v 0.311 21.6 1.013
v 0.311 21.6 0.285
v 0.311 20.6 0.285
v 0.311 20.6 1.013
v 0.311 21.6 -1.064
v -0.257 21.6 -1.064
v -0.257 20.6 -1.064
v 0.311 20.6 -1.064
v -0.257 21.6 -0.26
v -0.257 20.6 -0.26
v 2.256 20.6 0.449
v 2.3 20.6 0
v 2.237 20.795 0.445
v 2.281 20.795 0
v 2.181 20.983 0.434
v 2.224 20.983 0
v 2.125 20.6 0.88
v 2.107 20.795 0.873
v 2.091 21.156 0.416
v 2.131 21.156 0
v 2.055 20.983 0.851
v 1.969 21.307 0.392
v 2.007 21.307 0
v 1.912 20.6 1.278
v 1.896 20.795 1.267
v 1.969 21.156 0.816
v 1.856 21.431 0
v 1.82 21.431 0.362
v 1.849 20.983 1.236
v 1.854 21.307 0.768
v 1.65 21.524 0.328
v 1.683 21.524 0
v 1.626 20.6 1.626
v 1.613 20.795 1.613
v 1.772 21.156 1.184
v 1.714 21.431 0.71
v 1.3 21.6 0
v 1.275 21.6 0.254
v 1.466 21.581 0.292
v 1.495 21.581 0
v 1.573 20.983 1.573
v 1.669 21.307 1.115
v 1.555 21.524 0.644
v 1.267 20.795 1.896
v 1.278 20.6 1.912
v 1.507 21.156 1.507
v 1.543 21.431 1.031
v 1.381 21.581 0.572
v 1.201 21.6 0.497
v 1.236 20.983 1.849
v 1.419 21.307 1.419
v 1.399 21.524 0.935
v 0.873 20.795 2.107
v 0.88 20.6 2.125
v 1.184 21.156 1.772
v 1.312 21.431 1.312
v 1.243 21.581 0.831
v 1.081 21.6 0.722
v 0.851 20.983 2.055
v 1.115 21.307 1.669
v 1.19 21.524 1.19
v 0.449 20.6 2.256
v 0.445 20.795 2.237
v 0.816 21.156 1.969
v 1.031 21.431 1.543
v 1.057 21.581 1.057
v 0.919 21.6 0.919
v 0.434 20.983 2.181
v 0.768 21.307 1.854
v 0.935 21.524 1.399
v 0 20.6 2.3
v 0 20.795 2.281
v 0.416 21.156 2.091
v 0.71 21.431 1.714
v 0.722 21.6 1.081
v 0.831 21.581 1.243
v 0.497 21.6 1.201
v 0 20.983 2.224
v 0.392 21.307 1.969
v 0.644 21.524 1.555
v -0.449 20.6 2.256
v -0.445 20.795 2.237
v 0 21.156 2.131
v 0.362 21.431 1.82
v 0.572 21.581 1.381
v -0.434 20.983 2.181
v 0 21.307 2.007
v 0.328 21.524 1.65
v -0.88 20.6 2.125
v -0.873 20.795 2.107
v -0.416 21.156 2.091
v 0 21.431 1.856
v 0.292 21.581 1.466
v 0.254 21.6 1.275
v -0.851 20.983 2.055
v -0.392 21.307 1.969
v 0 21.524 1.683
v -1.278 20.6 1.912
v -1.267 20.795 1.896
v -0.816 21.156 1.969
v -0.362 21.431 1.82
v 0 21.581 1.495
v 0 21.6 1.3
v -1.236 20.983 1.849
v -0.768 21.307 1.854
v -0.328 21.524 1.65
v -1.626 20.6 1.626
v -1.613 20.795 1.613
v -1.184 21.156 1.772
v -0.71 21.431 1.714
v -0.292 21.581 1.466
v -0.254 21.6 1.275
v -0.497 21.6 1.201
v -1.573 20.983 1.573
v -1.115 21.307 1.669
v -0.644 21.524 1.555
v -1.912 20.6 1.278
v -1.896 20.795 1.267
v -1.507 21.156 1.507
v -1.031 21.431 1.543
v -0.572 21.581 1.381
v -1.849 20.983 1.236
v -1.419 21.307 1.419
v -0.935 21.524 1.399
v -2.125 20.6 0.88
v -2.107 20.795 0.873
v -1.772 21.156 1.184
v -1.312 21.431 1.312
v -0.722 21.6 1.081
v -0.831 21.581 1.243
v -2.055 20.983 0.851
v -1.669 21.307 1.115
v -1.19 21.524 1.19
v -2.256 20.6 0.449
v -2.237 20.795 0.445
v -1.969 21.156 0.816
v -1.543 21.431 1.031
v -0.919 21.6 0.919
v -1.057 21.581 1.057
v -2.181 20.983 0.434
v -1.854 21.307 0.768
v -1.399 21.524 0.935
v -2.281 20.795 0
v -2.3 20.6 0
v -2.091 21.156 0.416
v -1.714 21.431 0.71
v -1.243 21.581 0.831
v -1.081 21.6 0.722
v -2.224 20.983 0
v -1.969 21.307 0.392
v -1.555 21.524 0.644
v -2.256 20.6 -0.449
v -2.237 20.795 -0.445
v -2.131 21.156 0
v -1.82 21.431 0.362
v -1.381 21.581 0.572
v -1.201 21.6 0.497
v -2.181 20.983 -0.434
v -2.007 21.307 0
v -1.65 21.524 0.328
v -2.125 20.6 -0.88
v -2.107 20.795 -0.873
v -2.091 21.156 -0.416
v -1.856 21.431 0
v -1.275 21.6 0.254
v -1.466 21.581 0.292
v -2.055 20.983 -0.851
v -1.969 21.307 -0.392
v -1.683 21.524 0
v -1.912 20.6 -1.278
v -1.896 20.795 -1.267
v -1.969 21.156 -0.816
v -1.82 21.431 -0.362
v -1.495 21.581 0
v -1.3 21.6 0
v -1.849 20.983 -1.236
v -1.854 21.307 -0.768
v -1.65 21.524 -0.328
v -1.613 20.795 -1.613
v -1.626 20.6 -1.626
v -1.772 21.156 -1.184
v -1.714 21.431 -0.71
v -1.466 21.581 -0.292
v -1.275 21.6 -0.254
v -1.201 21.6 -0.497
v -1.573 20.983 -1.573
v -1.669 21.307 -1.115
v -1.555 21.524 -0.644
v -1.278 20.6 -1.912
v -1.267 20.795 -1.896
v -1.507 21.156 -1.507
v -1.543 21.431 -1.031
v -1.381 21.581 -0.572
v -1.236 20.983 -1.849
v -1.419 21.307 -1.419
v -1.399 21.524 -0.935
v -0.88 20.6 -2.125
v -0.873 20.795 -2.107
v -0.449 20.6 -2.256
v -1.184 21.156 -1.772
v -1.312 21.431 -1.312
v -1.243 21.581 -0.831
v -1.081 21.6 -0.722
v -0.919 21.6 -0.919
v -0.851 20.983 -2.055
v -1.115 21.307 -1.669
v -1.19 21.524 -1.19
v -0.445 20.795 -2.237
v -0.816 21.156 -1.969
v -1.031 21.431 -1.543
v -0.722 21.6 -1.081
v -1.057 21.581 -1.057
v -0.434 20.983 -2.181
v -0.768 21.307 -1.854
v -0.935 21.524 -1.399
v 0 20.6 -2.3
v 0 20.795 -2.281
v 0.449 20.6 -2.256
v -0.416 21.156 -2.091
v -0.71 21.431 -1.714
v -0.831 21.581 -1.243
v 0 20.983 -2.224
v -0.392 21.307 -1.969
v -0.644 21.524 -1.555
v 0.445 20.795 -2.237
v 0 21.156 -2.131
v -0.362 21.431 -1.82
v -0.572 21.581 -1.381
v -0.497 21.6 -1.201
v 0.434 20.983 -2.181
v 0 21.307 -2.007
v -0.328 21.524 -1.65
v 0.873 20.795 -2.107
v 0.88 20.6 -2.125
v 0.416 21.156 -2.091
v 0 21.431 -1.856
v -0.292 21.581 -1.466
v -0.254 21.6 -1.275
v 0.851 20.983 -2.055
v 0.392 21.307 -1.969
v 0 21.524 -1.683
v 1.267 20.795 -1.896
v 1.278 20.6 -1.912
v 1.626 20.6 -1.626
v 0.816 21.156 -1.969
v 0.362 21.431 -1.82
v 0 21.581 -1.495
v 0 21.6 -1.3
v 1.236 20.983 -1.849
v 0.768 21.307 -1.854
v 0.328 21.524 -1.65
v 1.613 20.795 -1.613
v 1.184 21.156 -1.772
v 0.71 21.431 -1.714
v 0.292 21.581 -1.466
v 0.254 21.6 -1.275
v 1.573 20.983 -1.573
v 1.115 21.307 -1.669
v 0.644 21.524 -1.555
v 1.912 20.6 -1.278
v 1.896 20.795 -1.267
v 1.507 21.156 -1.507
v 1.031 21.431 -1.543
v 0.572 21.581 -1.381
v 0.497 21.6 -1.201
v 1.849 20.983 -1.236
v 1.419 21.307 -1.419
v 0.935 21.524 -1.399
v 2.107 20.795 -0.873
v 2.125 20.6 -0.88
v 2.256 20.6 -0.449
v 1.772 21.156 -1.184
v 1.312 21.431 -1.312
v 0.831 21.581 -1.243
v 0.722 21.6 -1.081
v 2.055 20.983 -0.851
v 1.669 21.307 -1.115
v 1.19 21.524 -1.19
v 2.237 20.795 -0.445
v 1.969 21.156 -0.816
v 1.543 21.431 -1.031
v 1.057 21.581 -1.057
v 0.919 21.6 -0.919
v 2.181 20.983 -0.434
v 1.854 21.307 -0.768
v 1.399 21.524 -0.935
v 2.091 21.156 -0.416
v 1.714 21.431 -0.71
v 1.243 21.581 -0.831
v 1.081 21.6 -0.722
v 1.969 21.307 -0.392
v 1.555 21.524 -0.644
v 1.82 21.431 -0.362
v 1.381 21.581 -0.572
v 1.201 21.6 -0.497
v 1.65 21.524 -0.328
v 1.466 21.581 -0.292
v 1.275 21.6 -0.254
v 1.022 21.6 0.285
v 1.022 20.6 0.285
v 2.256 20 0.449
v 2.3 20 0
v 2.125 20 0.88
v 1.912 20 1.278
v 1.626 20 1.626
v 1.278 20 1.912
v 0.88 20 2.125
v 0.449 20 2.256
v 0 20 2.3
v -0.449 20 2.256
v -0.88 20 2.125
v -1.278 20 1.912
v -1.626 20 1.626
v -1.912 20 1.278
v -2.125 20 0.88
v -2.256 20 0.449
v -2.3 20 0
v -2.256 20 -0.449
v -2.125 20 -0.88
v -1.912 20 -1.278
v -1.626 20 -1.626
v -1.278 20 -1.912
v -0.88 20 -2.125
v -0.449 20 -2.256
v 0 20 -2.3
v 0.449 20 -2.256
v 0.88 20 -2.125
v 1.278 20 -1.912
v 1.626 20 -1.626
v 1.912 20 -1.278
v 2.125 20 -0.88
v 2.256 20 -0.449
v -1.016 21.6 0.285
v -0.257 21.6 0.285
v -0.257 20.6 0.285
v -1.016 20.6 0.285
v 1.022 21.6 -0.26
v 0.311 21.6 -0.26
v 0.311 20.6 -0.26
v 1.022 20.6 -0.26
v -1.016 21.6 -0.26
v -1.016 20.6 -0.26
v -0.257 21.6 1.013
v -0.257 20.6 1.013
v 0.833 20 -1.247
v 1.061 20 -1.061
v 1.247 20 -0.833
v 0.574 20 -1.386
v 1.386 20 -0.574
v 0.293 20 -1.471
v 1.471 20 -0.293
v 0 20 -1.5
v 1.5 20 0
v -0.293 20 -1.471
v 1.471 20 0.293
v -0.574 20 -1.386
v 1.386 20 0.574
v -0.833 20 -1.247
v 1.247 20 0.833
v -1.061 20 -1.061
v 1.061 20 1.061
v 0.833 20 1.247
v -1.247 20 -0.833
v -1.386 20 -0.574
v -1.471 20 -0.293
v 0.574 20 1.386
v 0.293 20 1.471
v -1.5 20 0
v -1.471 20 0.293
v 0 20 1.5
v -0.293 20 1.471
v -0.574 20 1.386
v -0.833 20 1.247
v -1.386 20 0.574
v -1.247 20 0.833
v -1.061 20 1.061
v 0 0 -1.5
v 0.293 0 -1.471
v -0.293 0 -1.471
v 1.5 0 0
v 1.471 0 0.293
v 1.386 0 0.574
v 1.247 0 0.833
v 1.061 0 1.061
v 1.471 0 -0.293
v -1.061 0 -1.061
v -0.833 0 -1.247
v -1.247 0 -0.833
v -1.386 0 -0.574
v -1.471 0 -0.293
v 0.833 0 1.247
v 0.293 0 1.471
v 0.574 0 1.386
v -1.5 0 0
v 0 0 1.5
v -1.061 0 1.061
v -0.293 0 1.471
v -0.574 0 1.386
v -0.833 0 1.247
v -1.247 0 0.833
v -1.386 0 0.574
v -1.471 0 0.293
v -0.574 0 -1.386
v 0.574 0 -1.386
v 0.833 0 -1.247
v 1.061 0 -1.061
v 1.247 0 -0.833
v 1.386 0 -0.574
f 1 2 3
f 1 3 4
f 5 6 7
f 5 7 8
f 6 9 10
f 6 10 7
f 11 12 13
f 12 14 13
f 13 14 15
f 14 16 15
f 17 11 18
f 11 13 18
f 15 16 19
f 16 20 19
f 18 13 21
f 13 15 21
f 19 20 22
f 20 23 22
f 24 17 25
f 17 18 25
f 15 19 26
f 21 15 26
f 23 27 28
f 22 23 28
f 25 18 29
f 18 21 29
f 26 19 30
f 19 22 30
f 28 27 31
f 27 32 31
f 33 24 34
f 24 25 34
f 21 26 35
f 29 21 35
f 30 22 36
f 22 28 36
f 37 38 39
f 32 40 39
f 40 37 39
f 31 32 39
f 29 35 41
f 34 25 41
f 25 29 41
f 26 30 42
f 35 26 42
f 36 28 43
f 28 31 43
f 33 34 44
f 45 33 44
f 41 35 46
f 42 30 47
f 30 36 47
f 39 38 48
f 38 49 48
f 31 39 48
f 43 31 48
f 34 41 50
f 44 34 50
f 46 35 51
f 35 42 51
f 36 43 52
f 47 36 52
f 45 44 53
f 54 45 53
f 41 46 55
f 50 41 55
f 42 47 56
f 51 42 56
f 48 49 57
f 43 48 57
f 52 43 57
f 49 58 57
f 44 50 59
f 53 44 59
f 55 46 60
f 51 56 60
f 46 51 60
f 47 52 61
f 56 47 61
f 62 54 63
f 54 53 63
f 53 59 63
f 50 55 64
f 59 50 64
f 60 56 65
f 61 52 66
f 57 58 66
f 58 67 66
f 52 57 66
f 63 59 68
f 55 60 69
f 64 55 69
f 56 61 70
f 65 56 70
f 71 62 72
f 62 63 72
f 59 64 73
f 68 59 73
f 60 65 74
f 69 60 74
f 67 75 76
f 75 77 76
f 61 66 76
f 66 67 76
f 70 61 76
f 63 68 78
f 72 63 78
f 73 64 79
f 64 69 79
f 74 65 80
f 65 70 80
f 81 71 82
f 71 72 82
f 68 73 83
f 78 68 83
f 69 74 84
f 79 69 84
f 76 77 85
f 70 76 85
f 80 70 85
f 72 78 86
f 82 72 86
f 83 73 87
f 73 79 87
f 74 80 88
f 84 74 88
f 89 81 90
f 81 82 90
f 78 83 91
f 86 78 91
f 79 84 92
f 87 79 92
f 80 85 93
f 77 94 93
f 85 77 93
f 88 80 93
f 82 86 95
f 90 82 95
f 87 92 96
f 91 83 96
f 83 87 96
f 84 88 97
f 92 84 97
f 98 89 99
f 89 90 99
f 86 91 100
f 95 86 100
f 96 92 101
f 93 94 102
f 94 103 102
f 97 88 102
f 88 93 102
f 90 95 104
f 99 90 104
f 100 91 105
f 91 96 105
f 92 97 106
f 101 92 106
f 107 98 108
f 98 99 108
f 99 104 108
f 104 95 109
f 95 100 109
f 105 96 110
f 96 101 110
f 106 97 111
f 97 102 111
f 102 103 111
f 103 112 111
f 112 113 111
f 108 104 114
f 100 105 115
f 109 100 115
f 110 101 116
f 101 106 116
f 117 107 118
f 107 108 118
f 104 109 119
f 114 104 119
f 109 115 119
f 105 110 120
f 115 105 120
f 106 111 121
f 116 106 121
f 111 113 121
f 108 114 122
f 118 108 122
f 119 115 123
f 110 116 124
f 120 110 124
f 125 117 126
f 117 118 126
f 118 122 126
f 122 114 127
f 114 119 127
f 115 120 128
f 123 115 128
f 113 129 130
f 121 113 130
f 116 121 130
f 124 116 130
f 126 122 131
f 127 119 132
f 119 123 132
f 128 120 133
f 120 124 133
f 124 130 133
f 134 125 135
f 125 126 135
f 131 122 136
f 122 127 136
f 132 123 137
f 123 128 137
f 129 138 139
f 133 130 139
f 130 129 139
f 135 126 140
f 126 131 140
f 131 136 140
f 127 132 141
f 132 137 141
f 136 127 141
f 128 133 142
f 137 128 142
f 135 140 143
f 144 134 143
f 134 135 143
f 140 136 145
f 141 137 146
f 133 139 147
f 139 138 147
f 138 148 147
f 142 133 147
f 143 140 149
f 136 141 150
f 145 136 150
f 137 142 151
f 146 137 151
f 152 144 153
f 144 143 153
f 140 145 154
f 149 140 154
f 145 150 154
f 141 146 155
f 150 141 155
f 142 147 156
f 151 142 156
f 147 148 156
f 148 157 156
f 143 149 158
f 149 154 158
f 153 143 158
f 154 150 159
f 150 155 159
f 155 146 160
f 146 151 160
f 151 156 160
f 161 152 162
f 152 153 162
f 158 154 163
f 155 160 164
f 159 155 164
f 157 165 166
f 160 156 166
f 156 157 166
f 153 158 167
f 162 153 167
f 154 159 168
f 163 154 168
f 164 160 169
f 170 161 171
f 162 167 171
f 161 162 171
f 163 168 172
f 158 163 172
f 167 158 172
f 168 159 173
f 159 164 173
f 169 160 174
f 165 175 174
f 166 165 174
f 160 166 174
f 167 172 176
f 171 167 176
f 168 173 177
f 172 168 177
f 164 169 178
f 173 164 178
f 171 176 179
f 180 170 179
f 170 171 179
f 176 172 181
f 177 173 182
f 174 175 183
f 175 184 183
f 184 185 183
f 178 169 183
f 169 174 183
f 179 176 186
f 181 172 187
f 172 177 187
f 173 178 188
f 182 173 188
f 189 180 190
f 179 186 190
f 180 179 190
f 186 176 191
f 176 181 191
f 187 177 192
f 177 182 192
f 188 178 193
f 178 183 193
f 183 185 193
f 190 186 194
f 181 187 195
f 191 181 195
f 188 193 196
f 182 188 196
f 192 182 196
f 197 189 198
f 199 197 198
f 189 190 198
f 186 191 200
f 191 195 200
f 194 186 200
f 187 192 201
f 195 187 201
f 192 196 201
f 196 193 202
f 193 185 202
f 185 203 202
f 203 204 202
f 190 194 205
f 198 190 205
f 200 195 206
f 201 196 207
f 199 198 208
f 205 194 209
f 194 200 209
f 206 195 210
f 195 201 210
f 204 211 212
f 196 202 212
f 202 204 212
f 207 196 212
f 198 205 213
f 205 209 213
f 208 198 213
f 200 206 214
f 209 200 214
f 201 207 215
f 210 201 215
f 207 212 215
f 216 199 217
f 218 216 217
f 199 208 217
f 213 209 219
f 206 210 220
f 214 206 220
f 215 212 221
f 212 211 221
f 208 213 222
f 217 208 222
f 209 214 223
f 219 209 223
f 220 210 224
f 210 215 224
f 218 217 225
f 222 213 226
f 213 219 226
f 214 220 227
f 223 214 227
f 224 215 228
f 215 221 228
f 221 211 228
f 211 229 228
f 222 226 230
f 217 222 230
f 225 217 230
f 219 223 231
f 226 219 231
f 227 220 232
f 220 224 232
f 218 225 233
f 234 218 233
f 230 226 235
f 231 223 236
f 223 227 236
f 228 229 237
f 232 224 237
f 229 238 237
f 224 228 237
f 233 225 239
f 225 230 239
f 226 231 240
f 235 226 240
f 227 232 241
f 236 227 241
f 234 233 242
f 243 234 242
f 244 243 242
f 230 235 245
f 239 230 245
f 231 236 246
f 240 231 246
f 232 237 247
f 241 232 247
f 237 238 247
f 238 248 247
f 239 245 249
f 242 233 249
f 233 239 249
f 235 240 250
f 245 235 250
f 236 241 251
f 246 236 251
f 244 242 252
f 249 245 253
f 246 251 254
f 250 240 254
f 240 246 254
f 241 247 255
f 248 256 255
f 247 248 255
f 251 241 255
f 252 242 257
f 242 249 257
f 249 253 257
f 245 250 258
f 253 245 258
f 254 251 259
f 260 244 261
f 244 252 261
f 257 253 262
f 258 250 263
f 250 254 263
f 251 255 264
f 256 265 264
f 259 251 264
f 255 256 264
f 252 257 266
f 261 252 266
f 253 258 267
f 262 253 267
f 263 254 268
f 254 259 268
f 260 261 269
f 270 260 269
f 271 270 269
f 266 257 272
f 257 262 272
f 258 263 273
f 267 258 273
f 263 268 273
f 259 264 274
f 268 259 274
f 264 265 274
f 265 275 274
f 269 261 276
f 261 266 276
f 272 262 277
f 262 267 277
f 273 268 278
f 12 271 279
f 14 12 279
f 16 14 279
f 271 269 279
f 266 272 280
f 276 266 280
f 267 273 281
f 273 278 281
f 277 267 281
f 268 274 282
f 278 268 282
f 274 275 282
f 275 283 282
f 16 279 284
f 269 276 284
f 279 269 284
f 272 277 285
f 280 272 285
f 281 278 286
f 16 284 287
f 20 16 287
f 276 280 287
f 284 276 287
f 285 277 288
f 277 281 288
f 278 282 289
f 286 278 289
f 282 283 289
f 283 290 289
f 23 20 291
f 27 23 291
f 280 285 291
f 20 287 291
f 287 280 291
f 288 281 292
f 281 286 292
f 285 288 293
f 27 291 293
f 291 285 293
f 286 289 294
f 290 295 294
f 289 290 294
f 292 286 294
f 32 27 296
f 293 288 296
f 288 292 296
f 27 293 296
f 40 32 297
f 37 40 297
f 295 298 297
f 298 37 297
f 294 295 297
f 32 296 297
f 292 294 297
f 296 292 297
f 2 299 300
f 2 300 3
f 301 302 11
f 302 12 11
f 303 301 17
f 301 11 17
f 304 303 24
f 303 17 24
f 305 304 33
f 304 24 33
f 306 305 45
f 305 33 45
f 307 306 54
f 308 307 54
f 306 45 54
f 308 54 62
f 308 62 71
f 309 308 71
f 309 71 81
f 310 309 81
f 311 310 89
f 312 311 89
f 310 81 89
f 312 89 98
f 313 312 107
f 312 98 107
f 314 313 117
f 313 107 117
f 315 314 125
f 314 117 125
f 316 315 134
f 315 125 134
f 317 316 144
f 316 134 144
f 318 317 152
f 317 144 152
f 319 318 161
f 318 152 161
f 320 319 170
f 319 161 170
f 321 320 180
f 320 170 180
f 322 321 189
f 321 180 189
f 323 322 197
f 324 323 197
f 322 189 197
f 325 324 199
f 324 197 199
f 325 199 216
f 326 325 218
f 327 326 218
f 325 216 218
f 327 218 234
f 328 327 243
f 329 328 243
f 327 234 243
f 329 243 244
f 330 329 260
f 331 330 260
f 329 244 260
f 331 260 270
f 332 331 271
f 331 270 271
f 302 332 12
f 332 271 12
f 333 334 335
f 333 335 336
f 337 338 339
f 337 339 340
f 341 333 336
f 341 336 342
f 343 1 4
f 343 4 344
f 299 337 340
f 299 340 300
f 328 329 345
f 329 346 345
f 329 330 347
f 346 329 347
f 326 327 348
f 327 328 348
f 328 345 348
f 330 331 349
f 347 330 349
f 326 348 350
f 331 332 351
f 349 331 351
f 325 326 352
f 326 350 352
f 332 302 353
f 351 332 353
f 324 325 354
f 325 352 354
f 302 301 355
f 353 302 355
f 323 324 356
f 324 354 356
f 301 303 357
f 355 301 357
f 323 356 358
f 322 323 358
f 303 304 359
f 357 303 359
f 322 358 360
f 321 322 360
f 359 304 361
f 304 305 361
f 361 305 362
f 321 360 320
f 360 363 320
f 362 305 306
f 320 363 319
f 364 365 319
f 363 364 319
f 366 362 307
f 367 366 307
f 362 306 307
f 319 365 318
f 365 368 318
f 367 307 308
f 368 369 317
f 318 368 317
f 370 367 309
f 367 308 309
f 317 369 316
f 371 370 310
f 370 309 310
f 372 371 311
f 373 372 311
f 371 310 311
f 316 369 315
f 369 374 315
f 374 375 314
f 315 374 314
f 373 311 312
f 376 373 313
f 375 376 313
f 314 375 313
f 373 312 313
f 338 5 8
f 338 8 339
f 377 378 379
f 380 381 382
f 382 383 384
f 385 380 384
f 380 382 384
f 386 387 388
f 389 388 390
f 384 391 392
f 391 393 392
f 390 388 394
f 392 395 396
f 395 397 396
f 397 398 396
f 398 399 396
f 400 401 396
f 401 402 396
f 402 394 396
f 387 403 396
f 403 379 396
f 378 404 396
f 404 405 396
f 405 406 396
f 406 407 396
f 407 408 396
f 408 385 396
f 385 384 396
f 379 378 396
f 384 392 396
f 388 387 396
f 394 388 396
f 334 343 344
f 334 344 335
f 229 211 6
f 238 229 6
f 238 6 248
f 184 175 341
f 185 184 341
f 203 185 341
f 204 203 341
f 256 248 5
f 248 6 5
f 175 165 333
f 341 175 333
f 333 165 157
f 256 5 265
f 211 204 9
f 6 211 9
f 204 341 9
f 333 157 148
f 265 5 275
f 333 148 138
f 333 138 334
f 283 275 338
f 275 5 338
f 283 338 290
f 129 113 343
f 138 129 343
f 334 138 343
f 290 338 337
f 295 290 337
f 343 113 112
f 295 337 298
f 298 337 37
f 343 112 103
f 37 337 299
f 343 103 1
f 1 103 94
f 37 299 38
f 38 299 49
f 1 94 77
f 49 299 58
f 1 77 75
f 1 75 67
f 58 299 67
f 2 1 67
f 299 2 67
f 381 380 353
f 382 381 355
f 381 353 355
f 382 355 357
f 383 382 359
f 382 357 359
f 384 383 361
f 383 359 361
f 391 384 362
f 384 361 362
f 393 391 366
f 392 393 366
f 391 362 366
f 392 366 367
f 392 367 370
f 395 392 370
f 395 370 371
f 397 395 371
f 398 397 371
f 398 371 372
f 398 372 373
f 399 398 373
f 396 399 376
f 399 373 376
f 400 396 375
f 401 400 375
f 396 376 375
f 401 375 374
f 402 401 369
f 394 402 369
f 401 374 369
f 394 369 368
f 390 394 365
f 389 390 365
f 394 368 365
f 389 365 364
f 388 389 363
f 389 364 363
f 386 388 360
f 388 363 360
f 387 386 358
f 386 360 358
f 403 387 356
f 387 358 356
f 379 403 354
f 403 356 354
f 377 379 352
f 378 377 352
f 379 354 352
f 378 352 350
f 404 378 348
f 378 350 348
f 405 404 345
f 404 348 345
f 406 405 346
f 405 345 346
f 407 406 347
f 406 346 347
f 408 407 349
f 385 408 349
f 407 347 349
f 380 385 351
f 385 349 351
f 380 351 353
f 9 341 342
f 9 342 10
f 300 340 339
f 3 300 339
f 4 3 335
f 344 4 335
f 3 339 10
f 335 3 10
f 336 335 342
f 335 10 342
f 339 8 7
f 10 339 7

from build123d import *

# Parameters (mm, degrees)
CUT_EXTRUDE_1_DEPTH = 1


with BuildPart() as part:
    # 草圖2 → 旋轉1 (revolve)
    with BuildSketch(Plane.XY):
        with BuildLine():
            Line((0, 0), (1.5, 0))
            Line((1.5, 0), (1.5, 20))
            Line((1.5, 20), (2.3, 20))
            Line((2.3, 20), (2.3, 20.6))
            ThreePointArc((2.3, 20.6), (2.007106781, 21.307106781), (1.3, 21.6))
            Line((1.3, 21.6), (0, 21.6))
            Line((0, 21.6), (0, 0))
        make_face()
    revolve(axis=Axis((0, 21.6, 0), (0, -1, 0)))

    # 草圖3 → 除料-伸長1 (cut)
    with BuildSketch(Plane(origin=(0, 21.6, 0), x_dir=(1, 0, 0), z_dir=(0, 1, 0))):
        Polygon((-0.257139239, 0.26020042), (-0.257139239, 1.063618051), (0.311378397, 1.063618051), (0.311378397, 0.26020042), (1.022434592, 0.26020042), (1.022434592, -0.285133973), (0.311378397, -0.285133973), (0.311378397, -1.013251047), (-0.257139239, -1.013251047), (-0.257139239, -0.285133973), (-1.016312229, -0.285133973), (-1.016312229, 0.26020042), align=None)
    extrude(amount=-CUT_EXTRUDE_1_DEPTH, mode=Mode.SUBTRACT)


solid = part.part
